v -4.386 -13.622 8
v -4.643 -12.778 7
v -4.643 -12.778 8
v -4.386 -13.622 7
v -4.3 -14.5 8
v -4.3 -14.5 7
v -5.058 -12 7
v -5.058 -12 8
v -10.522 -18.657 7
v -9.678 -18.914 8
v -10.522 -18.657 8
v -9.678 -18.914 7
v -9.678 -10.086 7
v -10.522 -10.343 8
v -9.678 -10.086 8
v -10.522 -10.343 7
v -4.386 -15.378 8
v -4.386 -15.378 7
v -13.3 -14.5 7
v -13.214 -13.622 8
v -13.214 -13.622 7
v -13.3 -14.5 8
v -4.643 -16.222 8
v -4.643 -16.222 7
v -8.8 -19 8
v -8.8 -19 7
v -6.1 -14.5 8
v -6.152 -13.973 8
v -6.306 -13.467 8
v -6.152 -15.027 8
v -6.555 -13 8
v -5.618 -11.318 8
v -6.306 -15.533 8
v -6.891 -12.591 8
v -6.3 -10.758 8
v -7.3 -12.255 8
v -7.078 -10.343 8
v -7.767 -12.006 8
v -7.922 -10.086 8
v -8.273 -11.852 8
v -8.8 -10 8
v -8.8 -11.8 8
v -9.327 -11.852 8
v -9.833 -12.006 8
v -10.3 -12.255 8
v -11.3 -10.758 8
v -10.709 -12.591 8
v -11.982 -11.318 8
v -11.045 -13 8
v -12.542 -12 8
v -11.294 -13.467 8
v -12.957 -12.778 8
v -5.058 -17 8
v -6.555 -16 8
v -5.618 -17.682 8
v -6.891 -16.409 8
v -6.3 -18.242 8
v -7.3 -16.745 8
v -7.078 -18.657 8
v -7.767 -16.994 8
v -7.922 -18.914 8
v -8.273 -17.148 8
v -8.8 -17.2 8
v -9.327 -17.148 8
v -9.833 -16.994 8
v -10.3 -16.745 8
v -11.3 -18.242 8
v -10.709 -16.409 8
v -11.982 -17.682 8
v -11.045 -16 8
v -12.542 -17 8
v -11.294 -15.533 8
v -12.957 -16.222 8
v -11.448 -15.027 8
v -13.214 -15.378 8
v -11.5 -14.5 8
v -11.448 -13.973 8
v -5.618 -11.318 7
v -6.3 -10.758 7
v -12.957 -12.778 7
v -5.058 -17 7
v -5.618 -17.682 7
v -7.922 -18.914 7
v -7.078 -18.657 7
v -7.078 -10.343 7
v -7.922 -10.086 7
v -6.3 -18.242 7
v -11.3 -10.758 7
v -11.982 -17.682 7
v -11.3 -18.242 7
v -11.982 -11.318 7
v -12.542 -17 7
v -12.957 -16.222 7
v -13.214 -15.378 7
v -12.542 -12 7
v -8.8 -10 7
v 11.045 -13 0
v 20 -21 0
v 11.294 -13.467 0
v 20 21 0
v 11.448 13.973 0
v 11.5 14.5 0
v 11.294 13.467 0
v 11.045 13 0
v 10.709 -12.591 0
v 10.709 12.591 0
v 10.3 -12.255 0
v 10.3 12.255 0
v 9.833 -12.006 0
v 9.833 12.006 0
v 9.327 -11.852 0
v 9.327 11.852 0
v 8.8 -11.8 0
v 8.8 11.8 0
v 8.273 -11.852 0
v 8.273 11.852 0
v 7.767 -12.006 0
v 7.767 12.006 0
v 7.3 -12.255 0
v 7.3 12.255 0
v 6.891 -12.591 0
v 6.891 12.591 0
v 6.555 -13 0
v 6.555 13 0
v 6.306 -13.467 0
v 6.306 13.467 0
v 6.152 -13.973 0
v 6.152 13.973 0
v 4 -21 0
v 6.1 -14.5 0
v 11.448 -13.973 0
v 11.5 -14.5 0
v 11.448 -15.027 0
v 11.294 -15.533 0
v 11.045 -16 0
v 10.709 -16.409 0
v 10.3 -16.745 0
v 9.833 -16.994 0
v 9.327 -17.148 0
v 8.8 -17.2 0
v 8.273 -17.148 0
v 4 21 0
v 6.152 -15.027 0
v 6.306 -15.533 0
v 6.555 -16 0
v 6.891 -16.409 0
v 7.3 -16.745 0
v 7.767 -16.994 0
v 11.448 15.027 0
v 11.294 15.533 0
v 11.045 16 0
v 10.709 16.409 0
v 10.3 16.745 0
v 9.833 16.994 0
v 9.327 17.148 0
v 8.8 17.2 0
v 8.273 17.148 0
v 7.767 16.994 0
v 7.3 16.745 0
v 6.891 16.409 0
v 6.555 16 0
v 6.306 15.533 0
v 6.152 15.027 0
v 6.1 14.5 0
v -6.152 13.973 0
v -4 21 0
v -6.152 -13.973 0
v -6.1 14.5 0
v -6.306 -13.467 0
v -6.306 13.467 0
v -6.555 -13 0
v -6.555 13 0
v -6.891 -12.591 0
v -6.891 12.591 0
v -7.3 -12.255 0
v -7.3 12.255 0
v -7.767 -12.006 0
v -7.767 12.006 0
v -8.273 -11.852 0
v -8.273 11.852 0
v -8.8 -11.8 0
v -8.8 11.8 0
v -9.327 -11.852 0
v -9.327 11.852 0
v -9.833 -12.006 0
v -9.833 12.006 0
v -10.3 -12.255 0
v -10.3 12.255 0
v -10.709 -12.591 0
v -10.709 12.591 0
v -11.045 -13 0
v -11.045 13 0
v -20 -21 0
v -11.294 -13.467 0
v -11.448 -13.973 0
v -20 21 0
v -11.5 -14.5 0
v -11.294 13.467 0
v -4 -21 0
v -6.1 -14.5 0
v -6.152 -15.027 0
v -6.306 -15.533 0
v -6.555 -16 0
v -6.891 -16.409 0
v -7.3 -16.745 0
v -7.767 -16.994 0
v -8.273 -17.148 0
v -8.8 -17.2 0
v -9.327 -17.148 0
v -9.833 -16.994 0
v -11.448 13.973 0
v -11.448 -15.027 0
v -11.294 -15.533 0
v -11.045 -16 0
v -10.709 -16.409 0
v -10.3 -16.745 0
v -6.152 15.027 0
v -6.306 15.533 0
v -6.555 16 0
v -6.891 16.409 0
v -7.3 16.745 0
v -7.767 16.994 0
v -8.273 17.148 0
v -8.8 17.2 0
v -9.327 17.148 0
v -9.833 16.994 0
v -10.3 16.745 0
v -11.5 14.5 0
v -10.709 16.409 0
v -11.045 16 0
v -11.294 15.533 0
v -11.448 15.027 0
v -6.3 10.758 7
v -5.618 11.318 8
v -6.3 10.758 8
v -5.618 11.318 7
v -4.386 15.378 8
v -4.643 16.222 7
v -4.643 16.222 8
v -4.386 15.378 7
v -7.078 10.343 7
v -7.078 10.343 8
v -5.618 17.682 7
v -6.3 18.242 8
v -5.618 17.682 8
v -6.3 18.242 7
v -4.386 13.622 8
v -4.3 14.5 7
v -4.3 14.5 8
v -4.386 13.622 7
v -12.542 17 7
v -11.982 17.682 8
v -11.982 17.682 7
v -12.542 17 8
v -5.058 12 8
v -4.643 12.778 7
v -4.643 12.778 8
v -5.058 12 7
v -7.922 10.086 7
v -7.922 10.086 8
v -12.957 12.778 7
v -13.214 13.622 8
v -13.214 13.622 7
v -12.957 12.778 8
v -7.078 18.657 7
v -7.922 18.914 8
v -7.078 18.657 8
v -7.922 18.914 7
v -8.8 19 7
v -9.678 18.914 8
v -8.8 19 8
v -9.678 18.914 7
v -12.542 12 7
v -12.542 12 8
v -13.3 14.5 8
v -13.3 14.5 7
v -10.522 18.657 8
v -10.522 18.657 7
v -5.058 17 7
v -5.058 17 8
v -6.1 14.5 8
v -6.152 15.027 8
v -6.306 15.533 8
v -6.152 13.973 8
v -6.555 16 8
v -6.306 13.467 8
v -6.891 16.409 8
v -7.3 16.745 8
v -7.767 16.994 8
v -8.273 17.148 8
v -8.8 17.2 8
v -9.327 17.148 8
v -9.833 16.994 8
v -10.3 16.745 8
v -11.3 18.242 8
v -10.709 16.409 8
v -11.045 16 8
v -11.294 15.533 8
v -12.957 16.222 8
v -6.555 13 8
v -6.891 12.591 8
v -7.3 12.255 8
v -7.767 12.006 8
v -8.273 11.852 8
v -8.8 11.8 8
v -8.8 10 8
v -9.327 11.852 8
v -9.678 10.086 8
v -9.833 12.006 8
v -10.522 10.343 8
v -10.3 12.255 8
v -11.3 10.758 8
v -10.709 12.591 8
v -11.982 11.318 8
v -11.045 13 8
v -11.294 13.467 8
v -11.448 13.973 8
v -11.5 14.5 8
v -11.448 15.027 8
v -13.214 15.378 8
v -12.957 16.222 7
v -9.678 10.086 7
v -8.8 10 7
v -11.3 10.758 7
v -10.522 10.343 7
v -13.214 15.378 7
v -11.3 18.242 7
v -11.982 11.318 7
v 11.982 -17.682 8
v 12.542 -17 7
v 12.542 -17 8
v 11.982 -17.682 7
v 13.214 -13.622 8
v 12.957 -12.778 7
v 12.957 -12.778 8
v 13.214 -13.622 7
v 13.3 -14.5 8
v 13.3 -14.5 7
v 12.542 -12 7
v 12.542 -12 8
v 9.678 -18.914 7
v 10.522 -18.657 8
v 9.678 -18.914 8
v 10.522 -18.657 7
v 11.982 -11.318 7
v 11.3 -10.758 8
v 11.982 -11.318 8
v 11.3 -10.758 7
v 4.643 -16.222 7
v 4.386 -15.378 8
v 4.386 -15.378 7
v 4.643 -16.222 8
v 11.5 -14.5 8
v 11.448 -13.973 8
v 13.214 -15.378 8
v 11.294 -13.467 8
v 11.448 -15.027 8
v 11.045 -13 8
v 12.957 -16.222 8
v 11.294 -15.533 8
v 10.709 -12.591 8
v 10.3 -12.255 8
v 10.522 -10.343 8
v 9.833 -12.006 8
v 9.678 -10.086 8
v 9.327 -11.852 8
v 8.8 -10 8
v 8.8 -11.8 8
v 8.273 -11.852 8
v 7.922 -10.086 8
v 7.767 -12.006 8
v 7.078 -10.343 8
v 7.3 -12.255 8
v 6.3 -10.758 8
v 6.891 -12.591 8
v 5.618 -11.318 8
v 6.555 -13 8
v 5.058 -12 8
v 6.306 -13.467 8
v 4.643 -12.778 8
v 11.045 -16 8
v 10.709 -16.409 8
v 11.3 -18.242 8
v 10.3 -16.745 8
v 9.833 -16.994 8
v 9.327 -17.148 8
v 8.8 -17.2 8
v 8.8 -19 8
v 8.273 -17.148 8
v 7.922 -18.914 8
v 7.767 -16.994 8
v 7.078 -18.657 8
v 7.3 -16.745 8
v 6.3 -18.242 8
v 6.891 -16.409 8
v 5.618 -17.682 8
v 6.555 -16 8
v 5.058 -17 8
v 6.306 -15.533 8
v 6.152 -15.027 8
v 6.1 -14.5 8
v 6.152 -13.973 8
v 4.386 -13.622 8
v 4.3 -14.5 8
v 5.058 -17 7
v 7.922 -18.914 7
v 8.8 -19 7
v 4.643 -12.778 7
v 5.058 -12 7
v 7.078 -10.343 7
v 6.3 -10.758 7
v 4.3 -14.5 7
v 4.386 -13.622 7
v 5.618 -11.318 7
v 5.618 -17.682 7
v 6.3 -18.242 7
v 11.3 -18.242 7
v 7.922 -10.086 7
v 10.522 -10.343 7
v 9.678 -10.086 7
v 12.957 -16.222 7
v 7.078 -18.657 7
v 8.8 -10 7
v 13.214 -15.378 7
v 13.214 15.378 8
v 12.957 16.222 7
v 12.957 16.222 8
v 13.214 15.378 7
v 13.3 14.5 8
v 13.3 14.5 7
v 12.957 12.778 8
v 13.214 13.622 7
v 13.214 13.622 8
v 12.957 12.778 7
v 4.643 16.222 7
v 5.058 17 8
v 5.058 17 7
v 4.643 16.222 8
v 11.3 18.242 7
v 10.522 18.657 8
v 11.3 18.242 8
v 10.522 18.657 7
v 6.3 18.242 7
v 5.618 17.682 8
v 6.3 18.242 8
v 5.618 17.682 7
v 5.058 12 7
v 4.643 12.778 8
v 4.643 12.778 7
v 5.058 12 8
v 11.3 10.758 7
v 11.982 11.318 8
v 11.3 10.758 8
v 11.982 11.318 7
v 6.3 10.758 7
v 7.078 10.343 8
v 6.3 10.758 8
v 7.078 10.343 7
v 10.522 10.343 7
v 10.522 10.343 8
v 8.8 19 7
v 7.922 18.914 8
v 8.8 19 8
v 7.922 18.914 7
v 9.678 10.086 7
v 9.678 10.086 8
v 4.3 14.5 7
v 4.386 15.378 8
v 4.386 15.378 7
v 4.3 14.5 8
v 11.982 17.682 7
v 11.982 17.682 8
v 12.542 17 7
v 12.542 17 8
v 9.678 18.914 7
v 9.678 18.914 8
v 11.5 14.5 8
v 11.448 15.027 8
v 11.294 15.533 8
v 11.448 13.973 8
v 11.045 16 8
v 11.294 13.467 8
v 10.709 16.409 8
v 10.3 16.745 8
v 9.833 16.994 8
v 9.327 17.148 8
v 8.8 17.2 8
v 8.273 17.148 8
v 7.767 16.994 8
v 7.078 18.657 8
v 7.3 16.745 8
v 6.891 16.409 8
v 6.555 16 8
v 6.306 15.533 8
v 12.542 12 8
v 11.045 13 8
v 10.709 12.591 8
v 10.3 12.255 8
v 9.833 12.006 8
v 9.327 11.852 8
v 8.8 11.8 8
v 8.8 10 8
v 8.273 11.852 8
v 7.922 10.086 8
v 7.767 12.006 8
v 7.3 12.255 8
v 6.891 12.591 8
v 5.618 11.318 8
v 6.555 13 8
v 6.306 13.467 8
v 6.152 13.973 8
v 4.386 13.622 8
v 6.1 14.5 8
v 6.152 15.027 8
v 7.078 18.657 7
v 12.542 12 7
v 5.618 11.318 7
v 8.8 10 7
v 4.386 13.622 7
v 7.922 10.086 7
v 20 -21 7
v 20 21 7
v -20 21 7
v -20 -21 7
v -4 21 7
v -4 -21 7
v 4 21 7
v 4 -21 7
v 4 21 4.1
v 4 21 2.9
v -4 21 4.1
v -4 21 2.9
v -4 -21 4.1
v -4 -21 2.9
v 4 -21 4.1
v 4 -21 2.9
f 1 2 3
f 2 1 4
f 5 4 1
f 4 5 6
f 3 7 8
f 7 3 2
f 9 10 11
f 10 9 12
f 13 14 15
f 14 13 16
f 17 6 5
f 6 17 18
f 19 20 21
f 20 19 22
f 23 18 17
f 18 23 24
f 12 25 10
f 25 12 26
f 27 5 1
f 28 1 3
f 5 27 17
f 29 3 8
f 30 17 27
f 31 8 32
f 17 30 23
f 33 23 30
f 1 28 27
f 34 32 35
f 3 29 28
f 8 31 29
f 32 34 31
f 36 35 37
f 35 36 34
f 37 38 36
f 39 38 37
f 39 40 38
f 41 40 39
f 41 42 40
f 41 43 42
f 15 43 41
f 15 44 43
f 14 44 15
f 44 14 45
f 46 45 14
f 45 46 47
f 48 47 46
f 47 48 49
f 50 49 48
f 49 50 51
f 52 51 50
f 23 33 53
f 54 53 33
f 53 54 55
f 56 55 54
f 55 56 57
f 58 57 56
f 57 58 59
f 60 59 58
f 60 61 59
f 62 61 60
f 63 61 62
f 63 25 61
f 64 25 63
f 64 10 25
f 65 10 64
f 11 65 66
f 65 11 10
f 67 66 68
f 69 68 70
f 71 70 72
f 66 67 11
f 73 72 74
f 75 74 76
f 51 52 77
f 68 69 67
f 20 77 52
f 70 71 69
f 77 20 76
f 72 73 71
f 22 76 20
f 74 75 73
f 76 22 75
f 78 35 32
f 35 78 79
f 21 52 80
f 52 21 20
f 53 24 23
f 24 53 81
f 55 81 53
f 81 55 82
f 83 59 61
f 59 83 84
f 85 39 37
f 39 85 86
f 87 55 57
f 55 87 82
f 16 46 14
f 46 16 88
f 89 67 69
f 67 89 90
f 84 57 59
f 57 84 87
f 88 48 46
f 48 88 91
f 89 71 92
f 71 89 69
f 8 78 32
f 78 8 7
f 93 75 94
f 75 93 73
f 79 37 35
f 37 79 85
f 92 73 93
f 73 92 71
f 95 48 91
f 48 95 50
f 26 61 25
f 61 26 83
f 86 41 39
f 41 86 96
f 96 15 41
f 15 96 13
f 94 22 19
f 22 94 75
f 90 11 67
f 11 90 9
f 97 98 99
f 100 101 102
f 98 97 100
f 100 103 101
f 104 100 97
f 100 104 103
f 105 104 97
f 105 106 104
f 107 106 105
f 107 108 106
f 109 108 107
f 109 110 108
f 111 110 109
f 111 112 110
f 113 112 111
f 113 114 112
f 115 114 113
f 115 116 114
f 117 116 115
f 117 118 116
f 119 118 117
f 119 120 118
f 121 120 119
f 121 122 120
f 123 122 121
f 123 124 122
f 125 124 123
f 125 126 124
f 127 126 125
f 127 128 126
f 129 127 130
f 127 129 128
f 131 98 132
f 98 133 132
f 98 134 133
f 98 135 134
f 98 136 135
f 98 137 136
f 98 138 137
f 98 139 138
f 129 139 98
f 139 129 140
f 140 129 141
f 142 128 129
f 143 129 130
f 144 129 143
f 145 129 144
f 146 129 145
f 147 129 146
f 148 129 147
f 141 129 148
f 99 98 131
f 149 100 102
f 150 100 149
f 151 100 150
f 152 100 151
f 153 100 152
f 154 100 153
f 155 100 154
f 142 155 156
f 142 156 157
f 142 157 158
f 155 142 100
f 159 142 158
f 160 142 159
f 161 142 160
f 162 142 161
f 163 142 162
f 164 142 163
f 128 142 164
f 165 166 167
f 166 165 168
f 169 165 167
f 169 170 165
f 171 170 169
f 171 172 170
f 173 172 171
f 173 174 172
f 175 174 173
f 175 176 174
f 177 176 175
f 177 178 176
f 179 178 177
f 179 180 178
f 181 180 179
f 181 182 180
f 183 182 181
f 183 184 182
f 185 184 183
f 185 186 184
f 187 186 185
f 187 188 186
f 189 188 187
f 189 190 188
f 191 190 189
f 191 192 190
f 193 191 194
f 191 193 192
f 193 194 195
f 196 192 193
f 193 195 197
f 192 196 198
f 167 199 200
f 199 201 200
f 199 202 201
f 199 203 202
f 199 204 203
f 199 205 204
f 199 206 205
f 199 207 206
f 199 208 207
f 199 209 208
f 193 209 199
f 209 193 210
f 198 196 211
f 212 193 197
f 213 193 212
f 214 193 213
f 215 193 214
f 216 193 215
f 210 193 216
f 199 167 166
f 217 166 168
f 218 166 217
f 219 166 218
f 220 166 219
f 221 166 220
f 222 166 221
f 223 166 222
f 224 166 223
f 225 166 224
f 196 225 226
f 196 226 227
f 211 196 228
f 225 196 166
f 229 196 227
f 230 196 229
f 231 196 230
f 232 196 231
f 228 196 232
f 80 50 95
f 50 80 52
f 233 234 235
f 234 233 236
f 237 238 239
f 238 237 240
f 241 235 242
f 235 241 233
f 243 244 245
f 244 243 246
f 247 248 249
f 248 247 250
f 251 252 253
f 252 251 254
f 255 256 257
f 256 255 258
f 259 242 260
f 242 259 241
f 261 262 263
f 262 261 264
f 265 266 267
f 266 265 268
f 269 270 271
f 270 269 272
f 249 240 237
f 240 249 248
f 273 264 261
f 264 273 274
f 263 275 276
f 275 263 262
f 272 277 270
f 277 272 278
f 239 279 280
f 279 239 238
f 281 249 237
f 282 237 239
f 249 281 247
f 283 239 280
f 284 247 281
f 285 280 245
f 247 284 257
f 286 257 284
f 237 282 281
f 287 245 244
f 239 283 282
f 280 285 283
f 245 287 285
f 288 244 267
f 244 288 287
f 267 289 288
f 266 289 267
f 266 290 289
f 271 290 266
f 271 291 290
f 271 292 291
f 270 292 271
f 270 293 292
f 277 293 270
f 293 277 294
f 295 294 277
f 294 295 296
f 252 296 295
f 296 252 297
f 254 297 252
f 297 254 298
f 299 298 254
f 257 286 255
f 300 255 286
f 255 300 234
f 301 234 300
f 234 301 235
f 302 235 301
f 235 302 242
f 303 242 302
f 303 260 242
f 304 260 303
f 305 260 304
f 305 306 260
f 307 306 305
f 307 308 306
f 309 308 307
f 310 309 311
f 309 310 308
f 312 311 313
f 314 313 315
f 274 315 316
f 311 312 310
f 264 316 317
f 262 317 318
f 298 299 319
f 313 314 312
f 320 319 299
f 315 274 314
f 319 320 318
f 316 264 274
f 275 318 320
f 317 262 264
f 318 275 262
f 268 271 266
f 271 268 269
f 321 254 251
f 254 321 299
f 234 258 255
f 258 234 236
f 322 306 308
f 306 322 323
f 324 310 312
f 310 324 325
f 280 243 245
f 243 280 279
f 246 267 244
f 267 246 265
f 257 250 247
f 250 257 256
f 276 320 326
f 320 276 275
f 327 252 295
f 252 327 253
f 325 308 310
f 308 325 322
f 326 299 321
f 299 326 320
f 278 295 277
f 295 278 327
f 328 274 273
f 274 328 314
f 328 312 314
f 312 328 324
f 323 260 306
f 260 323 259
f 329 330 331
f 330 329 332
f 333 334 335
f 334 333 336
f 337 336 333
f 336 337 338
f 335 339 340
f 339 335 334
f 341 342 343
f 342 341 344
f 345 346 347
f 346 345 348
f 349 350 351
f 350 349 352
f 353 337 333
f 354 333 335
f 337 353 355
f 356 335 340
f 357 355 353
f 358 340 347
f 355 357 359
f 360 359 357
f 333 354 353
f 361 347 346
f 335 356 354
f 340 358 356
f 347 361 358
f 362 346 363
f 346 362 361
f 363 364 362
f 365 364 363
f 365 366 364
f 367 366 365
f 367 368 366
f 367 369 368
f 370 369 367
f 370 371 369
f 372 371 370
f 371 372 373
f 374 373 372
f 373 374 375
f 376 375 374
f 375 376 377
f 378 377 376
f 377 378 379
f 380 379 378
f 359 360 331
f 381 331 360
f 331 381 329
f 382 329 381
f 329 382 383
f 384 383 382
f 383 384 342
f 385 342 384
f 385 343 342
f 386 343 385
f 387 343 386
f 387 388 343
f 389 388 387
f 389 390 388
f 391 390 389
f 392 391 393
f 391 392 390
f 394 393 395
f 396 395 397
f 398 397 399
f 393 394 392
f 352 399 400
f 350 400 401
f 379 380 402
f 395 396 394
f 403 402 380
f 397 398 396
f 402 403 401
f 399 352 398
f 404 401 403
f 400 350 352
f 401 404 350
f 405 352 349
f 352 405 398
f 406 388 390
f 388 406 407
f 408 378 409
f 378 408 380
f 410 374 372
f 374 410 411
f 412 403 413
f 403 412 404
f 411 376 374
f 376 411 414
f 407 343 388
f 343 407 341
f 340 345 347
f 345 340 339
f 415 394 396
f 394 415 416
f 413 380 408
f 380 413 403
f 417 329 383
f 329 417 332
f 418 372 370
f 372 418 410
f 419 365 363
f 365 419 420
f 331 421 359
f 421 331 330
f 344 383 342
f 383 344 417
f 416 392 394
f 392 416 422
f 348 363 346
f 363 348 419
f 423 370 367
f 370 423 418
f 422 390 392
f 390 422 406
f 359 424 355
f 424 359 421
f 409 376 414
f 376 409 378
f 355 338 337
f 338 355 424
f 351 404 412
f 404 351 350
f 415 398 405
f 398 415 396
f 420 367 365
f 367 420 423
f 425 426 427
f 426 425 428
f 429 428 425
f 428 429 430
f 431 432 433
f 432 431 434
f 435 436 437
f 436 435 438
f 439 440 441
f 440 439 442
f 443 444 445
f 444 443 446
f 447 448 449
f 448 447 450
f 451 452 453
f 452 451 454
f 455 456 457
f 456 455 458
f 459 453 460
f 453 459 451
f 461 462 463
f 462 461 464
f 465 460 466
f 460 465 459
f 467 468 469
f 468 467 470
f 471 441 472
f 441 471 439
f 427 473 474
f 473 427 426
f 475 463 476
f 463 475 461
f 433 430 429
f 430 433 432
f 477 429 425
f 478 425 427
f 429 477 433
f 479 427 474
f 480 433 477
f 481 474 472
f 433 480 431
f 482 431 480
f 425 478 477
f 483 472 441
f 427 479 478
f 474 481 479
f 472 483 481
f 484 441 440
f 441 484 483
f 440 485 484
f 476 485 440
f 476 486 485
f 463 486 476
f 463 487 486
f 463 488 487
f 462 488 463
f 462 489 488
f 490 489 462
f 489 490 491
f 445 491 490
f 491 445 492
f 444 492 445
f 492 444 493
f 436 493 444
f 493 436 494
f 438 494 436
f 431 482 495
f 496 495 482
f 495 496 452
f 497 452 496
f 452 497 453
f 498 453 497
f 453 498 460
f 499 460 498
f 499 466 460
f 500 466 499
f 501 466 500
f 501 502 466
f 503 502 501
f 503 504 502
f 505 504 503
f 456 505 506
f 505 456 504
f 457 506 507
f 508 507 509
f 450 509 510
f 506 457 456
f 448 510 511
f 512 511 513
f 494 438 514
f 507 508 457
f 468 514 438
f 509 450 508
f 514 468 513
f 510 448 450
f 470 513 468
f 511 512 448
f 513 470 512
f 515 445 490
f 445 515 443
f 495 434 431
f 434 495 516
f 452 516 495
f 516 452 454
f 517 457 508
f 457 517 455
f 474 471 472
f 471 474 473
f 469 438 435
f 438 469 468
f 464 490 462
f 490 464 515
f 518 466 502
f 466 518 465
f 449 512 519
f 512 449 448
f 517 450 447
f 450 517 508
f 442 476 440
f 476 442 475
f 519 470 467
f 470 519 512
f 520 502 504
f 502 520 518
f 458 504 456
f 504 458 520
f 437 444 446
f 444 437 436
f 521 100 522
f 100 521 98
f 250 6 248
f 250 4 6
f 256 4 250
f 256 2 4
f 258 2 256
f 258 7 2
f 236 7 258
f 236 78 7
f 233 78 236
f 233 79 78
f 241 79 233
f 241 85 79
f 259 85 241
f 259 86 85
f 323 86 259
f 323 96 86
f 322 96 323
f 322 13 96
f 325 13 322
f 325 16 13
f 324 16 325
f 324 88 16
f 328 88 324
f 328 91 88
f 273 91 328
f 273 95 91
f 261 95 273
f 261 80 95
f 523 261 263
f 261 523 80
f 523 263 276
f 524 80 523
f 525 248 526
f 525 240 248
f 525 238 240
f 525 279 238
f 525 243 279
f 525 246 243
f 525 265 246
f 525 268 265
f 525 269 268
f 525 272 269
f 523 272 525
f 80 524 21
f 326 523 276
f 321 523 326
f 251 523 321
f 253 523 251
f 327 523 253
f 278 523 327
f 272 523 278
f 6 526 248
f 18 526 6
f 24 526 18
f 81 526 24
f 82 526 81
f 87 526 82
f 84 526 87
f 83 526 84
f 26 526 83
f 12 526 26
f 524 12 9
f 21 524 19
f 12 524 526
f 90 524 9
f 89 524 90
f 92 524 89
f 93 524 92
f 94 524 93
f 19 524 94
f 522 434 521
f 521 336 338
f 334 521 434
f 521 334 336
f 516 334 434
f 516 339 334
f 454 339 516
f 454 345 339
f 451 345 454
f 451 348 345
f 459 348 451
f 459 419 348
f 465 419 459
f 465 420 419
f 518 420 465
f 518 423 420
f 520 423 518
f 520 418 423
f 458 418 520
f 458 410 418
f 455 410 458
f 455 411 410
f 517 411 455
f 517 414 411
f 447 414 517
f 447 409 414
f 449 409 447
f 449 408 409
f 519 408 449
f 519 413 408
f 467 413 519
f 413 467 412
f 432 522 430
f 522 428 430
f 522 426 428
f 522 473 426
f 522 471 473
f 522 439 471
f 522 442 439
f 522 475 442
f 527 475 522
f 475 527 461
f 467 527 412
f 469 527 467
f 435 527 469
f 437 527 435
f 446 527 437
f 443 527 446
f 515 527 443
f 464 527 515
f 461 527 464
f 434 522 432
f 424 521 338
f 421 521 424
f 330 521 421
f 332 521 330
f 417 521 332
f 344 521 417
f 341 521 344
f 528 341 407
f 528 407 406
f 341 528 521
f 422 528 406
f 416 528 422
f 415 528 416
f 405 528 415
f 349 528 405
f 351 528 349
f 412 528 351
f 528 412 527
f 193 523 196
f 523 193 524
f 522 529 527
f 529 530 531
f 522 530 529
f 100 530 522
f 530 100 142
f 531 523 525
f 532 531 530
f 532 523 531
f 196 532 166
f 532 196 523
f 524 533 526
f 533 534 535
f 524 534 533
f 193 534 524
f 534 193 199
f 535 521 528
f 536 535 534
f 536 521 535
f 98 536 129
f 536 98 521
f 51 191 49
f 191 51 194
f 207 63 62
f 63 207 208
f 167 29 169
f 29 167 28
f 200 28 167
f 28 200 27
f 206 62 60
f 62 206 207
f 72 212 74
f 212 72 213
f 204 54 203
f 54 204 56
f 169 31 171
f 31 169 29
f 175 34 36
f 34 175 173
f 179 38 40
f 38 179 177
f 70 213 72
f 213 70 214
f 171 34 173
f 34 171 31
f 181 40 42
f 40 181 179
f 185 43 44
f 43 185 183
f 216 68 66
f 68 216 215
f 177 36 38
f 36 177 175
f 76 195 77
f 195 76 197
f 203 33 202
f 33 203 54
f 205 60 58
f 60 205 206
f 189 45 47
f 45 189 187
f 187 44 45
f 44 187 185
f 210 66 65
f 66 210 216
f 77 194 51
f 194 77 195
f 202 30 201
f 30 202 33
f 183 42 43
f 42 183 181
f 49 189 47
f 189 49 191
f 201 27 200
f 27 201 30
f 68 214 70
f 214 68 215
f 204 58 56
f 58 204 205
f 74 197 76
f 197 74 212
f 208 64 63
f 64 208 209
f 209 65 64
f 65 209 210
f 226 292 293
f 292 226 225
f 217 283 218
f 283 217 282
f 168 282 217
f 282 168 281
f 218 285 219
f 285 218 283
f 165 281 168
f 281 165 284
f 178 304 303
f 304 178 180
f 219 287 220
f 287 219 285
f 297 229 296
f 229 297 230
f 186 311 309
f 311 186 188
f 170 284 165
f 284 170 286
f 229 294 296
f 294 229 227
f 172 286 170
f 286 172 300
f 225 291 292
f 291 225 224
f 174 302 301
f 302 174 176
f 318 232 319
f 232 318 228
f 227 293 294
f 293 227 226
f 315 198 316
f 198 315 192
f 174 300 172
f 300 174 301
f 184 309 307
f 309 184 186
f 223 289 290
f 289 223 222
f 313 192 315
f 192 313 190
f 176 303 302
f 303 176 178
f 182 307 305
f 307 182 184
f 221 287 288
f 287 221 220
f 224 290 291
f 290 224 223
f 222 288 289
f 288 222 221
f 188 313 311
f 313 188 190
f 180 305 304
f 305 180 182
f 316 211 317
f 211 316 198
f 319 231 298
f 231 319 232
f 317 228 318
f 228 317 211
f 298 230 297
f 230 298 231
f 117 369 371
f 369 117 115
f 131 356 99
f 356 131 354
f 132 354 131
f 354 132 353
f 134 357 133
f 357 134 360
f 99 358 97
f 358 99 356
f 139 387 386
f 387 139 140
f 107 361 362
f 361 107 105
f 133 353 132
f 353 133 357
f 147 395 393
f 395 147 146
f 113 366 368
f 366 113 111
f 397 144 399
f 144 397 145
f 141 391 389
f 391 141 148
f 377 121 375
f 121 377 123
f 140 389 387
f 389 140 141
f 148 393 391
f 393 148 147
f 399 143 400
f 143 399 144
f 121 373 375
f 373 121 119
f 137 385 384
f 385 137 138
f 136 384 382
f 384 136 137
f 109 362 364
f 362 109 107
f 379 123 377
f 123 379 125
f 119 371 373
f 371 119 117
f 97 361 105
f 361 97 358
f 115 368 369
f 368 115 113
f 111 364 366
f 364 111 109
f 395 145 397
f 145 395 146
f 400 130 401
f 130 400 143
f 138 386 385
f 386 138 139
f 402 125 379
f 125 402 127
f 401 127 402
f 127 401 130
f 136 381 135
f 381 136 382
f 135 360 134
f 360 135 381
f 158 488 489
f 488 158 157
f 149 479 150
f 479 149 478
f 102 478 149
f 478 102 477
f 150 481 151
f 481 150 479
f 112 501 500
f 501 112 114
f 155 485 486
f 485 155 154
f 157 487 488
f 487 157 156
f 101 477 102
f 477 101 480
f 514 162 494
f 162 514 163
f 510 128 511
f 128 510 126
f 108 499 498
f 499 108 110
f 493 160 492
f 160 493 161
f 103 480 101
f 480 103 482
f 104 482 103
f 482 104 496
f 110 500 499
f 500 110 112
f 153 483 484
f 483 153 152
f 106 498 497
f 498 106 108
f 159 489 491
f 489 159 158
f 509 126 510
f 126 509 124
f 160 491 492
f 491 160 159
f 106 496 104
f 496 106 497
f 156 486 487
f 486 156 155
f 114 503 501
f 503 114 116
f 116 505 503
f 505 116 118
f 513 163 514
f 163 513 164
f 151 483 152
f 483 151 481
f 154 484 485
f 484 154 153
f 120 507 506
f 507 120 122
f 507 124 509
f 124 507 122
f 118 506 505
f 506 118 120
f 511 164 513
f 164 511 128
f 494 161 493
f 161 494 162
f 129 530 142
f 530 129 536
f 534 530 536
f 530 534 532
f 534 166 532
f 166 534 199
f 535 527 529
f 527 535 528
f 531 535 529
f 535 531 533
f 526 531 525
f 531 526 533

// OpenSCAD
$fn = 32;

// ----------------------------------------------------------------------
// Living hinge: 40 x 42 mm plates, 1.2 mm flexible web
// ----------------------------------------------------------------------

// --- parameters (mm) ---
plate_len = 16;           // plate length outside the web
plate_w = 42;             // plate width
thick = 7;                // plate thickness
web_half = 4;             // half width of the flex band
web_t = 1.2;              // flexible web thickness
web_z = 2.9;              // web position inside the thickness
boss_d = 9;               // screw boss diameter
boss_h = 8;               // screw boss height
boss_x = 8.8;             // screw boss distance from the web
screw_d = 5.4;            // screw hole

difference() {
  union() {
    /* one flat strip, later thinned at the middle */
    translate([-20, -21, 0]) cube([40, 42, 7]);
    /* screw bosses, sunk 0.5 mm into the plates */
    for (sx = [-8.8, 8.8]) {
      for (sy = [-14.5, 14.5]) {
        translate([sx, sy, 0]) cylinder(h = boss_h, d = boss_d);
      }
    }
  }
  /* channel from below: leaves the web on top of it */
  translate([-4, -23.5, -2.5]) cube([8, 47, 5.4]);
  /* channel from above: thins the web down to web_t */
  translate([-4, -23.5, 4.1]) cube([8, 47, 5.4]);
  /* screw holes through the bosses */
  for (sx = [-8.8, 8.8]) {
    for (sy = [-14.5, 14.5]) {
      translate([sx, sy, -2.5]) cylinder(h = boss_h + 5, d = screw_d);
    }
  }
}
